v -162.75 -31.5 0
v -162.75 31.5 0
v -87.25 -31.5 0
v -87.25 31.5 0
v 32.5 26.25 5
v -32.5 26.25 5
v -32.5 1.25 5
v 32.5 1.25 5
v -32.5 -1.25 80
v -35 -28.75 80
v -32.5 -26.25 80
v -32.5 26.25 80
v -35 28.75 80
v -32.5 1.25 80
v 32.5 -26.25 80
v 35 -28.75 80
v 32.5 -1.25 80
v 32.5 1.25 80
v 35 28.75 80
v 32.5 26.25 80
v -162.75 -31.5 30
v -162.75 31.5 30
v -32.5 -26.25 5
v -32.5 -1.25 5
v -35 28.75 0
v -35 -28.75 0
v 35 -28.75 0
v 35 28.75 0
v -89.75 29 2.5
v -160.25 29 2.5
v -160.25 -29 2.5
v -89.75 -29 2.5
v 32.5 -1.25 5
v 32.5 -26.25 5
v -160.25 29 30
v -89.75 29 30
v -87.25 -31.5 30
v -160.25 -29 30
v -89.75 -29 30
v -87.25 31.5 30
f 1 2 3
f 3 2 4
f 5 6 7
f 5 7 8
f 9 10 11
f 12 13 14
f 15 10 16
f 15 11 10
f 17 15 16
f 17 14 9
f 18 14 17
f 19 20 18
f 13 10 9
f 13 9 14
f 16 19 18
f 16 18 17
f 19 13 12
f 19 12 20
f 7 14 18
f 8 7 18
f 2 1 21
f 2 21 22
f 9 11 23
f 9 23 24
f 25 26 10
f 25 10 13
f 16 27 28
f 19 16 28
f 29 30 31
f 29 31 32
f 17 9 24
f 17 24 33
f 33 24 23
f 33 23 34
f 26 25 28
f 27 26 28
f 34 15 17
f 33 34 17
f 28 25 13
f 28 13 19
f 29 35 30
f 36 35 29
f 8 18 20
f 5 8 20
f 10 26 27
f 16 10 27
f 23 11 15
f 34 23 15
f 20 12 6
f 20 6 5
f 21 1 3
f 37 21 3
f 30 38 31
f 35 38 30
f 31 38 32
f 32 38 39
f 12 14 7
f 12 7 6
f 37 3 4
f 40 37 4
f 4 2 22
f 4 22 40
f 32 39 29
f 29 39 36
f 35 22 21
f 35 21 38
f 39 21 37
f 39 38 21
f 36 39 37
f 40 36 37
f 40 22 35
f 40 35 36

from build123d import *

# Parameters (mm, degrees)
SKETCH_W        = 70
SKETCH_H        = 57.5
PAD_DEPTH       = 80
SKETCH001_W     = 65
SKETCH001_H     = 25
POCKET_DEPTH    = 75
SKETCH002_W     = 75.5
SKETCH002_H     = 63
PAD001_DEPTH    = 30
SKETCH003_W     = 70.5
SKETCH003_H     = 58
POCKET001_DEPTH = 27.5


with BuildPart() as box:
    # Sketch → Pad (new body)
    with BuildSketch(Plane.XY):
        Rectangle(SKETCH_W, SKETCH_H)
    extrude(amount=PAD_DEPTH)

    # Sketch001 (on Face6 of Pad) → Pocket (cut)
    with BuildSketch(Plane.XY.offset(80)):
        with Locations((0, 13.75)):
            Rectangle(SKETCH001_W, SKETCH001_H)
        with Locations((0, -13.75)):
            Rectangle(SKETCH001_W, SKETCH001_H)
    extrude(amount=-POCKET_DEPTH, mode=Mode.SUBTRACT)


with BuildPart() as lid:
    # Sketch002 → Pad001 (new body)
    with BuildSketch(Plane.XY):
        with Locations((-125, 0)):
            Rectangle(SKETCH002_W, SKETCH002_H)
    extrude(amount=PAD001_DEPTH)

    # Sketch003 (on Face6 of Pad001) → Pocket001 (cut)
    with BuildSketch(Plane.XY.offset(30)):
        with Locations((-125, 0)):
            Rectangle(SKETCH003_W, SKETCH003_H)
    extrude(amount=-POCKET001_DEPTH, mode=Mode.SUBTRACT)


solid = Compound([box.part, lid.part])
